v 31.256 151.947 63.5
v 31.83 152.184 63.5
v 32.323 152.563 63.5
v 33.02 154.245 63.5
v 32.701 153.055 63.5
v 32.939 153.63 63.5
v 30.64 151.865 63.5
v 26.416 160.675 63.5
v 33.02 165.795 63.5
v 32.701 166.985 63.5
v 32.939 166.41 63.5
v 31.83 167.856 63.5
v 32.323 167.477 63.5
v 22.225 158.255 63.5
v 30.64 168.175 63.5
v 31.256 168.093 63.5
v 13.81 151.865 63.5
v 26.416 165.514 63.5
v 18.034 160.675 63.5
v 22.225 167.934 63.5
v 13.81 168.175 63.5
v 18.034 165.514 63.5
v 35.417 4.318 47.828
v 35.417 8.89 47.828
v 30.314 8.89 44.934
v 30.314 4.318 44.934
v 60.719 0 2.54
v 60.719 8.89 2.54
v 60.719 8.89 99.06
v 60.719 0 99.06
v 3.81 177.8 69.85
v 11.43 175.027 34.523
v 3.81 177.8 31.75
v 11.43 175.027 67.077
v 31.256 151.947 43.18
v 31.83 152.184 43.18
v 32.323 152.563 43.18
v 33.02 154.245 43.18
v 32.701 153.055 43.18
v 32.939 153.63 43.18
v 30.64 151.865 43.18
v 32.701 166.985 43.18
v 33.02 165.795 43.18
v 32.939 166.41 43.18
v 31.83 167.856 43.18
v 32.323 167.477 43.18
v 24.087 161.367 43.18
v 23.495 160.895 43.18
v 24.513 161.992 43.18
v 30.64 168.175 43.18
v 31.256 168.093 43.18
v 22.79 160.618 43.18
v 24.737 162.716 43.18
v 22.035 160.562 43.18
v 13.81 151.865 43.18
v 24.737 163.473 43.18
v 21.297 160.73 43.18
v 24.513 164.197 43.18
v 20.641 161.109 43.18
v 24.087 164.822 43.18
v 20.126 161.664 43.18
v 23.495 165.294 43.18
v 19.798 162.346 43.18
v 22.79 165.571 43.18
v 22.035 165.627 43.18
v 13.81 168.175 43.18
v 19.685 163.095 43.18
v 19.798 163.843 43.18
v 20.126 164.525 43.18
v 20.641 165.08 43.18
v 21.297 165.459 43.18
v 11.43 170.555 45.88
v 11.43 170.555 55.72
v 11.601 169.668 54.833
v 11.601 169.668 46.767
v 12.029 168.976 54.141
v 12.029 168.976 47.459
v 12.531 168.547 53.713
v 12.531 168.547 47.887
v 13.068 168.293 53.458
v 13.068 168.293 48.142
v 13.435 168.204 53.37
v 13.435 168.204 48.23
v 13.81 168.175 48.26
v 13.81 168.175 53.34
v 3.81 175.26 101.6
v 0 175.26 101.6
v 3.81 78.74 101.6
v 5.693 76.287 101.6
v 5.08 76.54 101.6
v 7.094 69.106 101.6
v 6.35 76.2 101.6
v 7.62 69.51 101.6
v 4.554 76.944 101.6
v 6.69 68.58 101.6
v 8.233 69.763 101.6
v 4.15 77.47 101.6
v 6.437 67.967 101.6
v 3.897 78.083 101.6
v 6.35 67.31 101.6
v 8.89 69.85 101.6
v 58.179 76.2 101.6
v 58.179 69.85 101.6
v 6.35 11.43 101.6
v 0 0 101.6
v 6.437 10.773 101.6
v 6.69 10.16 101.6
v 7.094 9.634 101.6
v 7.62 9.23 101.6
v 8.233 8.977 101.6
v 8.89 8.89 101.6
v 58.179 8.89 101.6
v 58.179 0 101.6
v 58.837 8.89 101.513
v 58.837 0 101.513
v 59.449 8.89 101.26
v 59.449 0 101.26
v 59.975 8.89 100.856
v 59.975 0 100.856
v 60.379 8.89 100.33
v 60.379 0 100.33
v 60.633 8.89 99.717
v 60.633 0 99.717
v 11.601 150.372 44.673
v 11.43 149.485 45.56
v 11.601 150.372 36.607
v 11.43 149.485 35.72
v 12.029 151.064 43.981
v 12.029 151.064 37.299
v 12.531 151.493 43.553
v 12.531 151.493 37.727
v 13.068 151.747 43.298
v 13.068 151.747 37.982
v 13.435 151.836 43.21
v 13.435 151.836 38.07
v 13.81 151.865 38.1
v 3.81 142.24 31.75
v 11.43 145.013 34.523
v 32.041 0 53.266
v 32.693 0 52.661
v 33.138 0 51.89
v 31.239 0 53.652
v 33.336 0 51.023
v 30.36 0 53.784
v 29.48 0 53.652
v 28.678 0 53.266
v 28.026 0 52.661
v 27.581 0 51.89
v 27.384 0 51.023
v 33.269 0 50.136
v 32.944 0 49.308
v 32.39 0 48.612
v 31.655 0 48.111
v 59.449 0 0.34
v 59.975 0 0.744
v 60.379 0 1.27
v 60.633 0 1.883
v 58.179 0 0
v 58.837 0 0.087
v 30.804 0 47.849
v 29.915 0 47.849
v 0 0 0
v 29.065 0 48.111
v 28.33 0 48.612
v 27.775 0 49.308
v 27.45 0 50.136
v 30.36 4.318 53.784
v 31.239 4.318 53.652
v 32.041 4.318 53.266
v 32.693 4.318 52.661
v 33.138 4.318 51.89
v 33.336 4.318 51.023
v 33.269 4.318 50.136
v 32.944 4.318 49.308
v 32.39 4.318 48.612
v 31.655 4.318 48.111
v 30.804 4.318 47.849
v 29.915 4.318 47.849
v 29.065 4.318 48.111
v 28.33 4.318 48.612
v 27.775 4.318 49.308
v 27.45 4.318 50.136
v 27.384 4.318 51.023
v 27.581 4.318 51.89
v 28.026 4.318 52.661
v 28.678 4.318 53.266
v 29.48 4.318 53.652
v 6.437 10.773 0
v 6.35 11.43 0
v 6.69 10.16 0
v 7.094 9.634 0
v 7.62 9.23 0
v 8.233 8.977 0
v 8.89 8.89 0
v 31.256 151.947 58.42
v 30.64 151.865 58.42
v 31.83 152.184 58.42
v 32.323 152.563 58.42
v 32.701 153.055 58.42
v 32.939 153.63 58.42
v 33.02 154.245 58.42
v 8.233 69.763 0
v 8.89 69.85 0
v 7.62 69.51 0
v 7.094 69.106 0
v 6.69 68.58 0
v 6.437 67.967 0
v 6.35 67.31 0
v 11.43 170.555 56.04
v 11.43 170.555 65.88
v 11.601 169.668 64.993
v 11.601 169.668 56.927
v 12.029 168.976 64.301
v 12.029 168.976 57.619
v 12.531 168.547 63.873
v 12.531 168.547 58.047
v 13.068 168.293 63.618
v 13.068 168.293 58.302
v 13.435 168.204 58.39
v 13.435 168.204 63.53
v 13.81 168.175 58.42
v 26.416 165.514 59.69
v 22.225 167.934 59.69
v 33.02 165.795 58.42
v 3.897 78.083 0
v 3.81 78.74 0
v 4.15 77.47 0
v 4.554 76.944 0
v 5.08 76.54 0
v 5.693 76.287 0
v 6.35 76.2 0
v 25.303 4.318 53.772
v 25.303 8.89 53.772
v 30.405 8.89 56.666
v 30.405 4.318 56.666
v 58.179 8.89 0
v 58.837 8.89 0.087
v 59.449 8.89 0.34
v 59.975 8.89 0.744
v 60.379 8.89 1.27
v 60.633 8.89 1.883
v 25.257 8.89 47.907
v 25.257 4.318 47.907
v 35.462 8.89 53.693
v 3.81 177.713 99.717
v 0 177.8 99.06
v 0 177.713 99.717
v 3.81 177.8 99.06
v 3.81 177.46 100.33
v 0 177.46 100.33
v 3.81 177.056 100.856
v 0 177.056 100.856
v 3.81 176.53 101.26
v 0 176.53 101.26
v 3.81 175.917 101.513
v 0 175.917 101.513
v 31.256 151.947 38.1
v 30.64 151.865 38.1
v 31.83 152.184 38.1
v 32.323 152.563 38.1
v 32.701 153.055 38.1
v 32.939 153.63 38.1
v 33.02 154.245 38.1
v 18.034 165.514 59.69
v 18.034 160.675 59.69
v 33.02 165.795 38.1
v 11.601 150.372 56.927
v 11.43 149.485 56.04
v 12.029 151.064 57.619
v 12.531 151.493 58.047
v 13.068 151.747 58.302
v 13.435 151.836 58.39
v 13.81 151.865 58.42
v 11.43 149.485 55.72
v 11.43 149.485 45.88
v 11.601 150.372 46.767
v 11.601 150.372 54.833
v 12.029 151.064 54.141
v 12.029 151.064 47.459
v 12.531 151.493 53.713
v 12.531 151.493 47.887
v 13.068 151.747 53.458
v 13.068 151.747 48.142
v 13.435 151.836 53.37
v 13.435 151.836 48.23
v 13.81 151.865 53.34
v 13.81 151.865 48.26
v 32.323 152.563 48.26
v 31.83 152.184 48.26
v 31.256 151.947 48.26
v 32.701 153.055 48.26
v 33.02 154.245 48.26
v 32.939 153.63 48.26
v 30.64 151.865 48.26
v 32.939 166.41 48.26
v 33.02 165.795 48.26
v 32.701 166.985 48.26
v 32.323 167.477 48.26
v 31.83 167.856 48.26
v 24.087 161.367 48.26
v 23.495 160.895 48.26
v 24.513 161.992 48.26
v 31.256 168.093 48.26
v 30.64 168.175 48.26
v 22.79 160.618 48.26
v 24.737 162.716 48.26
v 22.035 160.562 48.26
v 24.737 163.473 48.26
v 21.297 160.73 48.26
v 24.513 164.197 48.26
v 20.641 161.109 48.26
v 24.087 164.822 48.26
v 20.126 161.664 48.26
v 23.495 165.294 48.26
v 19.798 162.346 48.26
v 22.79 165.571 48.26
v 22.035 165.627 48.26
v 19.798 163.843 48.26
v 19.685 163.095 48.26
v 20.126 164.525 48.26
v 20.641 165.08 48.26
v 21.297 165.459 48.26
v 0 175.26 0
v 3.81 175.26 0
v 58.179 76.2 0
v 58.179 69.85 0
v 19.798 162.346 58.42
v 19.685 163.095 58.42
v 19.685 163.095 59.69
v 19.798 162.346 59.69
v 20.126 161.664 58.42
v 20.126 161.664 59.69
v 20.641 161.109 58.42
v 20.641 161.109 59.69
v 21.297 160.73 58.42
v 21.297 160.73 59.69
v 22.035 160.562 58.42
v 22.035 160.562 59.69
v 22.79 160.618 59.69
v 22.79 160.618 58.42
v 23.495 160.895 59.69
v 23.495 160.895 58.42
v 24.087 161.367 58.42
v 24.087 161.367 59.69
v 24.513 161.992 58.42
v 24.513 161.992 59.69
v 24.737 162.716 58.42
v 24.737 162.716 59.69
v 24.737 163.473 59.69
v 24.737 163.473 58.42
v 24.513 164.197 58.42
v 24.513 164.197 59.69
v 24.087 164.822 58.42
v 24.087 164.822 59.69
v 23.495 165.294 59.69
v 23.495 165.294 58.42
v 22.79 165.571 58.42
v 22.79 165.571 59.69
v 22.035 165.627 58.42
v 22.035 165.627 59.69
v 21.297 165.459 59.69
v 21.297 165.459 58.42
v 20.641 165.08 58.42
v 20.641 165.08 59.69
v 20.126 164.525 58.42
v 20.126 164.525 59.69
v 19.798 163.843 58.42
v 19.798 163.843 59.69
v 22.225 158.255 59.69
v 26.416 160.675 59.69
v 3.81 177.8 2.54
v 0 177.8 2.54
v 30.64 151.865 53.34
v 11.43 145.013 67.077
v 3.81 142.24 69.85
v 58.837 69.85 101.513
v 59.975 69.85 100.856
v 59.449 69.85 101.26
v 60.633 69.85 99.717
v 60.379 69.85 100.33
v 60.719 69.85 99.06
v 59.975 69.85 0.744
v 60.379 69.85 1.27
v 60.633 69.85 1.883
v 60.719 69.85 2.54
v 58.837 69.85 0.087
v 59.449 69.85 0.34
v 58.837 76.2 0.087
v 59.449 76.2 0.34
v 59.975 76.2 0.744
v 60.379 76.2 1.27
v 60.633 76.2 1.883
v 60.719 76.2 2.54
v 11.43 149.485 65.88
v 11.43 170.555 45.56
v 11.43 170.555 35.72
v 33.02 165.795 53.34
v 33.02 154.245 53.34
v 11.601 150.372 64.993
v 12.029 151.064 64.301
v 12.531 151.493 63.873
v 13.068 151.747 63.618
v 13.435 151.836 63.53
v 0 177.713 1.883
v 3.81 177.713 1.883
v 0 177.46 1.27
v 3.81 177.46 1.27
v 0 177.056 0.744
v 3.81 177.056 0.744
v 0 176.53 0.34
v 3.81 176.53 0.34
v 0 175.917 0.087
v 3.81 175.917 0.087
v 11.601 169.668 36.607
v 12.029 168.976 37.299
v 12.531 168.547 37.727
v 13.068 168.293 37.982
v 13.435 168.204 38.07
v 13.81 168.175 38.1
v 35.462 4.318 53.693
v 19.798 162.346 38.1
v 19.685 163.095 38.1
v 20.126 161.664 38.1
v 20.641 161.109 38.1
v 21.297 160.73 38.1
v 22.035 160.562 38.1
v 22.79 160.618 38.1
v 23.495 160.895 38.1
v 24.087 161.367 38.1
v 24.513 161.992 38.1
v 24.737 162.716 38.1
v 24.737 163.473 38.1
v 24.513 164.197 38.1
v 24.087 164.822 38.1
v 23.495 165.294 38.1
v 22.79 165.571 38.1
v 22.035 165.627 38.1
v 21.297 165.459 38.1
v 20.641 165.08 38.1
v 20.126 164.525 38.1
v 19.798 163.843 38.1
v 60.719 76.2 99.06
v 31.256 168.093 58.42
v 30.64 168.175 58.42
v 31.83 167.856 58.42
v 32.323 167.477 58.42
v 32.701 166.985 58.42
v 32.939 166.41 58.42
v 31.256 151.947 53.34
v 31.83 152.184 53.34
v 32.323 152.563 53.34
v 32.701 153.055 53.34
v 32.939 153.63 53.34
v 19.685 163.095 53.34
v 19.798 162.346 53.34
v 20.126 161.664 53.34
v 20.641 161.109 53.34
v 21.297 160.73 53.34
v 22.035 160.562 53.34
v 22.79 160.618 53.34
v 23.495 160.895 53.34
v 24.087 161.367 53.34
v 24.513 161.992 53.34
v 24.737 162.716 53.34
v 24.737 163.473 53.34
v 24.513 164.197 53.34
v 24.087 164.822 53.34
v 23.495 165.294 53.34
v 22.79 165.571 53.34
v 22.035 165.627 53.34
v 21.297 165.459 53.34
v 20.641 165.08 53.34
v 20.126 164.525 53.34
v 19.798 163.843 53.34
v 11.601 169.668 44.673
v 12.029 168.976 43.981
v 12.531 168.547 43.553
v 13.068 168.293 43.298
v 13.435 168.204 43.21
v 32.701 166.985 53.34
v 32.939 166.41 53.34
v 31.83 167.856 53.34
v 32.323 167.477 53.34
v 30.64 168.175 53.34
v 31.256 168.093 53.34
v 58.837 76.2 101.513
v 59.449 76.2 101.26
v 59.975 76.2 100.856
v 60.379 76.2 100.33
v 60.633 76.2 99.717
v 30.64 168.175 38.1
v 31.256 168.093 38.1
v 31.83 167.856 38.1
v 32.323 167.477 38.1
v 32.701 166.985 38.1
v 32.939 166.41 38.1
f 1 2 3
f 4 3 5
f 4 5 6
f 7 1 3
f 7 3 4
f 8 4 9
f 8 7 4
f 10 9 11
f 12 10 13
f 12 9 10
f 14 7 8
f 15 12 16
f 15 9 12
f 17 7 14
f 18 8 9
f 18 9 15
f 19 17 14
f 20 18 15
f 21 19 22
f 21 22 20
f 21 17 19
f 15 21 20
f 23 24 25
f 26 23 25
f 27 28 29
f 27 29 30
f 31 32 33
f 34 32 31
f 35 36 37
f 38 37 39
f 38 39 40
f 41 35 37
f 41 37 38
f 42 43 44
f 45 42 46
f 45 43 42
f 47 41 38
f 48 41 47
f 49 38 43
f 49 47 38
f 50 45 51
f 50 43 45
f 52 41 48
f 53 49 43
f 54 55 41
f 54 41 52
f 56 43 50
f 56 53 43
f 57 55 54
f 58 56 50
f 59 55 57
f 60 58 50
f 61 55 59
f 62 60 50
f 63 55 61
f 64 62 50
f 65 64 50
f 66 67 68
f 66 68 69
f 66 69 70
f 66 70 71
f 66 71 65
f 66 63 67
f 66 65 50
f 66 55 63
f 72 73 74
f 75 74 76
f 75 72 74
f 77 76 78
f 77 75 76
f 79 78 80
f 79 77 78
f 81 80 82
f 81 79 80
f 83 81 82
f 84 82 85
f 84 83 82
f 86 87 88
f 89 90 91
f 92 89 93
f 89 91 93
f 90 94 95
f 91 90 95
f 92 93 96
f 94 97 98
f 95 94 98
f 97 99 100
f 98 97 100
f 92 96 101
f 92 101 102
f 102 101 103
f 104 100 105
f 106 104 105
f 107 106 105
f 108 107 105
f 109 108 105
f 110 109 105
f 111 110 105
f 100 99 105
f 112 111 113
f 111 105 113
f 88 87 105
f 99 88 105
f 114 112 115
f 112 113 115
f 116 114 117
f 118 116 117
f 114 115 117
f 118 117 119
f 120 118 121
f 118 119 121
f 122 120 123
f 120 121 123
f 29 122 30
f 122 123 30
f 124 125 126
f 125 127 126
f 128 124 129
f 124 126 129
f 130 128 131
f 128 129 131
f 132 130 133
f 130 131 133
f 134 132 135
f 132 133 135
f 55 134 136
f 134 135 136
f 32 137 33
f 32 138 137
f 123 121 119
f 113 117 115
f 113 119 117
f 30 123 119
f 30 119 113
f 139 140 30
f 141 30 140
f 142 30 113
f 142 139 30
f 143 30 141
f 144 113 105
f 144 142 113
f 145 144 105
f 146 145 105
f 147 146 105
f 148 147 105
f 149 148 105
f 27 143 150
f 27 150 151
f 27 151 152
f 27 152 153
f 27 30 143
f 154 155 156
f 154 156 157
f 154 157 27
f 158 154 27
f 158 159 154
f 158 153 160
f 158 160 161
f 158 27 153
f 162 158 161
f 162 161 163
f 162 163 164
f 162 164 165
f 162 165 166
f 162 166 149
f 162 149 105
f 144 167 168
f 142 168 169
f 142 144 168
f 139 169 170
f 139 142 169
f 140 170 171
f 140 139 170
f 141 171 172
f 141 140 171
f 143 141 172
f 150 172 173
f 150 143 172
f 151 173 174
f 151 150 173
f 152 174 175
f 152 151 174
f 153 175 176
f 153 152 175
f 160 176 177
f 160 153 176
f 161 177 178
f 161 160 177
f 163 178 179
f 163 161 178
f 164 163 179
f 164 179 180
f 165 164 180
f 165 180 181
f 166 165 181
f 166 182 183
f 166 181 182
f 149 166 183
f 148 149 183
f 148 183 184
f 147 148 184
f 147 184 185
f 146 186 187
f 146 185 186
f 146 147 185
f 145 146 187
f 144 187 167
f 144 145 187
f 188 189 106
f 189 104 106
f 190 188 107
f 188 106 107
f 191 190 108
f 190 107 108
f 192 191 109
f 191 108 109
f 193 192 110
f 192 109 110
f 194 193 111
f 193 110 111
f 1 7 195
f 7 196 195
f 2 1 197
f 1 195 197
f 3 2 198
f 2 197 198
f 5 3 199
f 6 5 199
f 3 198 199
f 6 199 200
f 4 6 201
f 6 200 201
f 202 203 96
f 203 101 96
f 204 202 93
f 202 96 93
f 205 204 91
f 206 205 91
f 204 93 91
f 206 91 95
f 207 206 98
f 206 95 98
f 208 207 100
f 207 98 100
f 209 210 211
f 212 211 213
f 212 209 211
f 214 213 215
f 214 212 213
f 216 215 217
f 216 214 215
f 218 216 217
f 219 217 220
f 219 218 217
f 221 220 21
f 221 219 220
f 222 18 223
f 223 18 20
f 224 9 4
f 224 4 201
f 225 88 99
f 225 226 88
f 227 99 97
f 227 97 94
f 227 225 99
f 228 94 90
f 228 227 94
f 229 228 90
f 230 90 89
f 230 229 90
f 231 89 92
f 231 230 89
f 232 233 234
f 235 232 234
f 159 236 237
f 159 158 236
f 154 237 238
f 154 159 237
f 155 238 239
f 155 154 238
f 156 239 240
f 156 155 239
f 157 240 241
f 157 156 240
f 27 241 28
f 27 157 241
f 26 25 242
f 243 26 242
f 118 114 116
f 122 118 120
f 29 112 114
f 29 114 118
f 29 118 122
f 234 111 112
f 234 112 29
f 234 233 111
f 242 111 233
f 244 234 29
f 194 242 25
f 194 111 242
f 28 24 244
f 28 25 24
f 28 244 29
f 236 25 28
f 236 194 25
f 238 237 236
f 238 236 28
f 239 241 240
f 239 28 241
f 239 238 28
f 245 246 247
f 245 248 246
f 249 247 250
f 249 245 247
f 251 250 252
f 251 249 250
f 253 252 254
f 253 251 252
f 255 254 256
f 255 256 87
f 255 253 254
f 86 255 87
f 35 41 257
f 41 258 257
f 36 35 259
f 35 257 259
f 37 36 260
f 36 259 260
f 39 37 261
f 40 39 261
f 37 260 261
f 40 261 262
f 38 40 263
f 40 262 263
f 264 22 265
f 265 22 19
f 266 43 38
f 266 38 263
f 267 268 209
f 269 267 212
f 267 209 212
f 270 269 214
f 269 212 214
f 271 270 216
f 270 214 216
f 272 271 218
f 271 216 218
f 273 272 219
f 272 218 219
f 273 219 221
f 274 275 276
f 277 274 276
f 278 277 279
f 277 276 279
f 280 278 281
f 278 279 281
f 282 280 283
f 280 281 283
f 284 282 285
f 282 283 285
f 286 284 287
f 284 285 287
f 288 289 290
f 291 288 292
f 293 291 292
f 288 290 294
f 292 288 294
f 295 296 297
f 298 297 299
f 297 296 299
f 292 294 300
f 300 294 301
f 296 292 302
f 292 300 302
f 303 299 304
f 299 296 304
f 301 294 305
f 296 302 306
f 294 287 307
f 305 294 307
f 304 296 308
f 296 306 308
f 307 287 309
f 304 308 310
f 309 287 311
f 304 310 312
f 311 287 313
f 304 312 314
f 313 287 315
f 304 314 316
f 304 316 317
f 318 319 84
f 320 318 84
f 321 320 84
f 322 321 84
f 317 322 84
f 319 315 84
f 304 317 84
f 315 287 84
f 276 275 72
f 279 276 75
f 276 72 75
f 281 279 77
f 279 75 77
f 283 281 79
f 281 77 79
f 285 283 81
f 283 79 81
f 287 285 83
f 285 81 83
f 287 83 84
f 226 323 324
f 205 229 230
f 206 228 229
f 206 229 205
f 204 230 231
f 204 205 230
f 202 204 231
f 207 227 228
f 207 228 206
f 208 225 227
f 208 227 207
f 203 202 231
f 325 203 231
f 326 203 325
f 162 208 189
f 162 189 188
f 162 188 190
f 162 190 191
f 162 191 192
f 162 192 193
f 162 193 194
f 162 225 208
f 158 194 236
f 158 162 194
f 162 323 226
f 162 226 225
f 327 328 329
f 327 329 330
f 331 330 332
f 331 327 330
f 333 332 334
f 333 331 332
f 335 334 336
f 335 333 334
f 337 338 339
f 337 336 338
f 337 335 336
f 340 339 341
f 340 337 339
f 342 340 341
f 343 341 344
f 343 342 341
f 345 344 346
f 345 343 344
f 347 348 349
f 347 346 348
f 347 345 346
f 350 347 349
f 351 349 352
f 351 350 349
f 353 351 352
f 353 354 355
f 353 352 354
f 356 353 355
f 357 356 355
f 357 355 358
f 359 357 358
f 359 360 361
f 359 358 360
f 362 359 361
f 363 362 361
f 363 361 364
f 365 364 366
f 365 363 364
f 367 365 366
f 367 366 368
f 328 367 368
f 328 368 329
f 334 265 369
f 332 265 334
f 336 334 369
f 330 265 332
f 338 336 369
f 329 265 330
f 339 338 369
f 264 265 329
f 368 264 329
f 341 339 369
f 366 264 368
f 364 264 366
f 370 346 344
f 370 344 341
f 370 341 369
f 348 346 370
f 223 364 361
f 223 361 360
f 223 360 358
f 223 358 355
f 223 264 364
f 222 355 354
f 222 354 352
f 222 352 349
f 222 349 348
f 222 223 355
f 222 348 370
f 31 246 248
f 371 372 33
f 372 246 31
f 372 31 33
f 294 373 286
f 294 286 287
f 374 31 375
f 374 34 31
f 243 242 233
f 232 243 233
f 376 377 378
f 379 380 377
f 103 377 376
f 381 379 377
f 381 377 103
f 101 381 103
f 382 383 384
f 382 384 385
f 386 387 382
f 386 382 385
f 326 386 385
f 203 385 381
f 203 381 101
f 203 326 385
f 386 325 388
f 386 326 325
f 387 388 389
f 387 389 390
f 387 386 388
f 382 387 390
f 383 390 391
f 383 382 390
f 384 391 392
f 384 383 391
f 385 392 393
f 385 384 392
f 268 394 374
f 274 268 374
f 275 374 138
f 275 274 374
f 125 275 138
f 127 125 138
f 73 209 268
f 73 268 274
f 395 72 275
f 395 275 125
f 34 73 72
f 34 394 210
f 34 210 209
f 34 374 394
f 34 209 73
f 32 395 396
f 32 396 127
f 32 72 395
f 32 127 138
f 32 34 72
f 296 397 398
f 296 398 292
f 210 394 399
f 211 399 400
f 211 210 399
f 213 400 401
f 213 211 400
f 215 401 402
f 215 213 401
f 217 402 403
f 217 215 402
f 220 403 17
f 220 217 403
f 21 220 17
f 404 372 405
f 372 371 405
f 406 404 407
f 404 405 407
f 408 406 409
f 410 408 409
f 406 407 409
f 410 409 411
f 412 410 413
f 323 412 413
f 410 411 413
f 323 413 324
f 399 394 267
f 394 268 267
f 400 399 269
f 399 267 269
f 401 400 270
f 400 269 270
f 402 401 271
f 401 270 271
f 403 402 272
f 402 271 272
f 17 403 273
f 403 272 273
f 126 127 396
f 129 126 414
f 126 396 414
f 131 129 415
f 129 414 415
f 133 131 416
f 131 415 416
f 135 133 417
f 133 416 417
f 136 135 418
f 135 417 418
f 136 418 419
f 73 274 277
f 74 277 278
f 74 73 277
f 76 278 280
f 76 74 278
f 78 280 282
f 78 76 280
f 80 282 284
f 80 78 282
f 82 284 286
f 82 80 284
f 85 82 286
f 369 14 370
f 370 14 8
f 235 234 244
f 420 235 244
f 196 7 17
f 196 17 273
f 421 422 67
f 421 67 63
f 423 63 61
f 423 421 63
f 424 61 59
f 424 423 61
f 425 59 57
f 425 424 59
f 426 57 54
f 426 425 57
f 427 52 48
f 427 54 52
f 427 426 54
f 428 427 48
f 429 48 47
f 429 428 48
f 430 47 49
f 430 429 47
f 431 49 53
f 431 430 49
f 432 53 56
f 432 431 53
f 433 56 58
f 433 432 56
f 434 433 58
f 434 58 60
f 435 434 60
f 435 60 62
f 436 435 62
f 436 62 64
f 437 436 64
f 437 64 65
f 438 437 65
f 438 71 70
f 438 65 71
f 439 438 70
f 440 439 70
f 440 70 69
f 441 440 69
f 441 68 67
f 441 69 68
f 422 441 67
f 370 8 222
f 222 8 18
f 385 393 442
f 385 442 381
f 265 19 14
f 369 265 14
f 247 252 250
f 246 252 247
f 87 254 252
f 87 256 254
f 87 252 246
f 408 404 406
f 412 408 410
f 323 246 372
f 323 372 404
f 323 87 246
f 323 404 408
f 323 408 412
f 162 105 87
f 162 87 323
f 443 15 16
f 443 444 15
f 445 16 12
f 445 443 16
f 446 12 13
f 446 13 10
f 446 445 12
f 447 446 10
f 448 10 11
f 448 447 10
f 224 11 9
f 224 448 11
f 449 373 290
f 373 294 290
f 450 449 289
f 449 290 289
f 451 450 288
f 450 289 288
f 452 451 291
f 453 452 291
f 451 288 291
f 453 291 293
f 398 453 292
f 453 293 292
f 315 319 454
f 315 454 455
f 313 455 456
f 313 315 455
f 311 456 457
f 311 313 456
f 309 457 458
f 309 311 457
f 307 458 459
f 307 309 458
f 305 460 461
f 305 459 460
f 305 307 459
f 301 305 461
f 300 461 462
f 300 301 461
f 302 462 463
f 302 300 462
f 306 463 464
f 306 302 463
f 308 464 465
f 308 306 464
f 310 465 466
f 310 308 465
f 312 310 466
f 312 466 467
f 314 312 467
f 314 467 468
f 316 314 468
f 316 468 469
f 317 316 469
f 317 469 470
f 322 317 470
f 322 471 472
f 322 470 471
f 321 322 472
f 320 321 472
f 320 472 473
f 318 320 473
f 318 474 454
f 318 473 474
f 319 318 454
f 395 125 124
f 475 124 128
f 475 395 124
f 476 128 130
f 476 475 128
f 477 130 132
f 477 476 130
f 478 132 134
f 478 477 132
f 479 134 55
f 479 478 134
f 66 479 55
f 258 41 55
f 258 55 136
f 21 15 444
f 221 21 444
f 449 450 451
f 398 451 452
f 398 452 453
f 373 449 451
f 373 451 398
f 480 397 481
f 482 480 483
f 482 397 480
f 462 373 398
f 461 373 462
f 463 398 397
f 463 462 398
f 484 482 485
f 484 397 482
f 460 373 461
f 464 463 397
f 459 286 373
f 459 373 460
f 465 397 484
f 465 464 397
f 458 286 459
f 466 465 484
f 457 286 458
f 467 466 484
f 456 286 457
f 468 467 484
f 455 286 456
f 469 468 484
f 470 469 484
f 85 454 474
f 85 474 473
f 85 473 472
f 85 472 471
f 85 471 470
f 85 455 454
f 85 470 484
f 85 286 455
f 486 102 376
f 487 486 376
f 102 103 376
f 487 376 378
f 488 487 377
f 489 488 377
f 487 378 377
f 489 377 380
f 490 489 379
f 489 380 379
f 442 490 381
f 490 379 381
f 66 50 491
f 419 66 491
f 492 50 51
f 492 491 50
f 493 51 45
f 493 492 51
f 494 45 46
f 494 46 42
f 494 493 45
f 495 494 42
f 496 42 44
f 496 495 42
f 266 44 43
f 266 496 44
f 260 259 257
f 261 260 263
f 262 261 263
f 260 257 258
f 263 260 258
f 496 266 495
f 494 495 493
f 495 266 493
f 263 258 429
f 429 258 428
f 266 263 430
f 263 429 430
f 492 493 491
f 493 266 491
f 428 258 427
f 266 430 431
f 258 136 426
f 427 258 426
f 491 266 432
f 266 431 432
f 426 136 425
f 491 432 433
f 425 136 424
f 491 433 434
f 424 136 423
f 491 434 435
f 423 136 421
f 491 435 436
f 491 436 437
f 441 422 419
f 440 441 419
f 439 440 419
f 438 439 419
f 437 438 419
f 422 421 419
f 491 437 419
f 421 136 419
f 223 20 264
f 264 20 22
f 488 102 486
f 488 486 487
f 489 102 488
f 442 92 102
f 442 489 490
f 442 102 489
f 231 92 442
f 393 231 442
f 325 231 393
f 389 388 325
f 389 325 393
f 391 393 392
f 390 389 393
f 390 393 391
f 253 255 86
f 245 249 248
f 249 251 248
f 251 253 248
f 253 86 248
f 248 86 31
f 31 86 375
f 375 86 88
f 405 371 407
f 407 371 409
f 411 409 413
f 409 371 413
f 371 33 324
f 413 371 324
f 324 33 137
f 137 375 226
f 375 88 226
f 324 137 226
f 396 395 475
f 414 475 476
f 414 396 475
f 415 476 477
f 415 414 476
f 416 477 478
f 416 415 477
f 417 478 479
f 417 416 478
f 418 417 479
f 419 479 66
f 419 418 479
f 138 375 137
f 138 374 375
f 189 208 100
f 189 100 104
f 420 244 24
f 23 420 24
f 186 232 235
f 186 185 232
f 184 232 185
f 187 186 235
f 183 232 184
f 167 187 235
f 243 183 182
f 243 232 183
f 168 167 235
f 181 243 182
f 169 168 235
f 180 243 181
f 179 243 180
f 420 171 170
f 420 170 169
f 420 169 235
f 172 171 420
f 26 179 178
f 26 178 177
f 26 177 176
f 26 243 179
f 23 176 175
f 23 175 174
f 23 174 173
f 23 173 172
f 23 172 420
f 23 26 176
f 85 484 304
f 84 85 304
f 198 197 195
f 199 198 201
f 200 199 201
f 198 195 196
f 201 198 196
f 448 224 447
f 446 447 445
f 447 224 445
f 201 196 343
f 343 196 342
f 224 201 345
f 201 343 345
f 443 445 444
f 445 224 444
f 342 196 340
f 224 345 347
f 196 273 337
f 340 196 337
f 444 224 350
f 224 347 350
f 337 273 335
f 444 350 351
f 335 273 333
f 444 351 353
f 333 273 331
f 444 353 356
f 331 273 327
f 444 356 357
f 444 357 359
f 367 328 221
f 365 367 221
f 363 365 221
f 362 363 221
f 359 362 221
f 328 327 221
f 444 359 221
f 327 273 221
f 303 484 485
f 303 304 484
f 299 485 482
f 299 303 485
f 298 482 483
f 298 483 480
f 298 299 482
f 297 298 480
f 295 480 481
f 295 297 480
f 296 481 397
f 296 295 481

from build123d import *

# Parameters (mm, degrees)
BOSS_EXTRUDE1_DEPTH            = 101.6
CUT_EXTRUDE2_REACH             = 142.769
SKETCH2_R                      = 2.9845
CUT_EXTRUDE2_DIRECTION_2_DEPTH = 141.768746531
SKETCH8_W                      = 3.81
SKETCH8_H                      = 101.6
BOSS_EXTRUDE3_DEPTH            = 101.6
CUT_EXTRUDE5_DEPTH             = 4.572
SKETCH24_W                     = 38.1
SKETCH24_H                     = 35.56
BOSS_EXTRUDE8_DEPTH            = 7.62
BOSS_EXTRUDE8_TAPER            = 20
SKETCH29_W                     = 5.08
SKETCH29_H                     = 16.309015266
BOSS_EXTRUDE10_DEPTH           = 21.59
CUT_EXTRUDE8_DEPTH             = 199.322792527
CUT_EXTRUDE8_DEPTH_BACK        = 199.322792527
SKETCH30_R                     = 2.54
FILLET8_R                      = 2.38
CUT_EXTRUDE9_DEPTH             = 3.81
FILLET9_R                      = 2.54


with BuildPart() as part:
    # Sketch1 → Boss-Extrude1 (new body)
    with BuildSketch(Plane.XY):
        Polygon((0, 0), (0, 76.2), (60.71935441, 76.2), (60.71935441, 69.85), (6.35, 69.85), (6.35, 8.89), (60.71935441, 8.89), (60.71935441, 0), align=None)
    extrude(amount=BOSS_EXTRUDE1_DEPTH)

    # Sketch2 → Cut-Extrude2 (cut, up to next)
    with BuildSketch(Plane(origin=(0, 0, 0), x_dir=(1, 0, 0), z_dir=(0, 1, 0)), mode=Mode.PRIVATE) as cut_extrude2_sk1:
        with Locations(Location((30.359677205, -50.8, 0), (0, 0, 270))):
            Circle(SKETCH2_R)
    cut_extrude2_tool1 = extrude(cut_extrude2_sk1.sketch, amount=CUT_EXTRUDE2_REACH, mode=Mode.PRIVATE) & part.part
    add(cut_extrude2_tool1.solids().sort_by_distance((30.359677, 0, 50.8))[0], mode=Mode.SUBTRACT)

    # Sketch2 → Cut-Extrude2 direction 2 (cut)
    with BuildSketch(Plane(origin=(0, 0, 0), x_dir=(1, 0, 0), z_dir=(0, 1, 0))):
        with Locations(Location((30.359677205, -50.8, 0), (0, 0, 270))):
            Circle(SKETCH2_R)
    extrude(amount=-CUT_EXTRUDE2_DIRECTION_2_DEPTH, mode=Mode.SUBTRACT)

    # Sketch8 → Boss-Extrude3 (add)
    with BuildSketch(Plane(origin=(0, 76.2, 0), x_dir=(1, 0, 0), z_dir=(0, 1, 0))):
        with Locations((1.905, -50.8)):
            Rectangle(SKETCH8_W, SKETCH8_H)
    extrude(amount=BOSS_EXTRUDE3_DEPTH)

    # Sketch20 → Cut-Extrude5 (cut)
    with BuildSketch(Plane(origin=(0, 8.89, 0), x_dir=(1, 0, 0), z_dir=(0, 1, 0))):
        Polygon((35.462369538, -53.693279158), (35.416676623, -47.827578391), (30.31398429, -44.934299233), (25.256984872, -47.906720842), (25.302677788, -53.772421609), (30.405370121, -56.665700767), align=None)
    extrude(amount=-CUT_EXTRUDE5_DEPTH, mode=Mode.SUBTRACT)

    # Sketch24 → Boss-Extrude8 (add)
    with BuildSketch(Plane(origin=(3.81, 0, 0), x_dir=(0, 0, -1), z_dir=(1, 0, 0))):
        with Locations((-50.8, 160.02)):
            Rectangle(SKETCH24_W, SKETCH24_H)
    extrude(amount=BOSS_EXTRUDE8_DEPTH, taper=BOSS_EXTRUDE8_TAPER)

    # Sketch29 → Boss-Extrude10 (add)
    with BuildSketch(Plane(origin=(11.43, 0, 0), x_dir=(0, 0, -1), z_dir=(1, 0, 0))):
        with Locations((-60.96, 160.02)):
            Rectangle(SKETCH29_W, SKETCH29_H)
        with Locations((-50.8, 160.02)):
            Rectangle(SKETCH29_W, SKETCH29_H)
        with Locations((-40.64, 160.02)):
            Rectangle(SKETCH29_W, SKETCH29_H)
    extrude(amount=BOSS_EXTRUDE10_DEPTH)

    # Sketch30 → Cut-Extrude8 (cut, two sides: drawn at the far end of the back side and taken through both)
    with BuildSketch(Plane.XY.offset(63.5).offset(-CUT_EXTRUDE8_DEPTH_BACK)):
        with Locations(Location((22.225, 163.094507633, 0), (0, 0, 180))):
            Circle(SKETCH30_R)
    extrude(amount=CUT_EXTRUDE8_DEPTH + CUT_EXTRUDE8_DEPTH_BACK, mode=Mode.SUBTRACT)

    # Fillet8
    fillet8_edges = [part.edges().sort_by_distance(p)[0] for p in [
        (33.02, 168.174507633, 40.64),
        (11.43, 160.02, 43.18),
        (11.43, 151.865492367, 40.64),
        (33.02, 151.865492367, 40.64),
        (11.43, 168.174507633, 40.64),
        (11.43, 160.02, 38.1),
        (33.02, 168.174507633, 50.8),
        (11.43, 160.02, 53.34),
        (11.43, 151.865492367, 50.8),
        (33.02, 151.865492367, 50.8),
        (11.43, 168.174507633, 50.8),
        (11.43, 160.02, 48.26),
        (33.02, 168.174507633, 60.96),
        (11.43, 160.02, 63.5),
        (11.43, 151.865492367, 60.96),
        (33.02, 151.865492367, 60.96),
        (11.43, 168.174507633, 60.96),
        (11.43, 160.02, 58.42),
    ]]
    fillet(fillet8_edges, radius=FILLET8_R)

    # Sketch31 → Cut-Extrude9 (cut)
    with BuildSketch(Plane.XY.offset(63.5)):
        Polygon((26.416, 165.514182611), (22.225, 167.93385759), (18.034, 165.514182611), (18.034, 160.674832655), (22.225, 158.255157677), (26.416, 160.674832655), align=None)
    extrude(amount=-CUT_EXTRUDE9_DEPTH, mode=Mode.SUBTRACT)

    # Fillet9
    fillet9_edges = [part.edges().sort_by_distance(p)[0] for p in [
        (60.71935441, 4.445, 0),
        (6.35, 69.85, 50.8),
        (6.35, 8.89, 50.8),
        (60.71935441, 73.025, 101.6),
        (3.81, 76.2, 50.8),
        (1.905, 177.8, 101.6),
        (1.905, 177.8, 0),
        (60.71935441, 4.445, 101.6),
        (60.71935441, 73.025, 0),
    ]]
    fillet(fillet9_edges, radius=FILLET9_R)


solid = part.part
